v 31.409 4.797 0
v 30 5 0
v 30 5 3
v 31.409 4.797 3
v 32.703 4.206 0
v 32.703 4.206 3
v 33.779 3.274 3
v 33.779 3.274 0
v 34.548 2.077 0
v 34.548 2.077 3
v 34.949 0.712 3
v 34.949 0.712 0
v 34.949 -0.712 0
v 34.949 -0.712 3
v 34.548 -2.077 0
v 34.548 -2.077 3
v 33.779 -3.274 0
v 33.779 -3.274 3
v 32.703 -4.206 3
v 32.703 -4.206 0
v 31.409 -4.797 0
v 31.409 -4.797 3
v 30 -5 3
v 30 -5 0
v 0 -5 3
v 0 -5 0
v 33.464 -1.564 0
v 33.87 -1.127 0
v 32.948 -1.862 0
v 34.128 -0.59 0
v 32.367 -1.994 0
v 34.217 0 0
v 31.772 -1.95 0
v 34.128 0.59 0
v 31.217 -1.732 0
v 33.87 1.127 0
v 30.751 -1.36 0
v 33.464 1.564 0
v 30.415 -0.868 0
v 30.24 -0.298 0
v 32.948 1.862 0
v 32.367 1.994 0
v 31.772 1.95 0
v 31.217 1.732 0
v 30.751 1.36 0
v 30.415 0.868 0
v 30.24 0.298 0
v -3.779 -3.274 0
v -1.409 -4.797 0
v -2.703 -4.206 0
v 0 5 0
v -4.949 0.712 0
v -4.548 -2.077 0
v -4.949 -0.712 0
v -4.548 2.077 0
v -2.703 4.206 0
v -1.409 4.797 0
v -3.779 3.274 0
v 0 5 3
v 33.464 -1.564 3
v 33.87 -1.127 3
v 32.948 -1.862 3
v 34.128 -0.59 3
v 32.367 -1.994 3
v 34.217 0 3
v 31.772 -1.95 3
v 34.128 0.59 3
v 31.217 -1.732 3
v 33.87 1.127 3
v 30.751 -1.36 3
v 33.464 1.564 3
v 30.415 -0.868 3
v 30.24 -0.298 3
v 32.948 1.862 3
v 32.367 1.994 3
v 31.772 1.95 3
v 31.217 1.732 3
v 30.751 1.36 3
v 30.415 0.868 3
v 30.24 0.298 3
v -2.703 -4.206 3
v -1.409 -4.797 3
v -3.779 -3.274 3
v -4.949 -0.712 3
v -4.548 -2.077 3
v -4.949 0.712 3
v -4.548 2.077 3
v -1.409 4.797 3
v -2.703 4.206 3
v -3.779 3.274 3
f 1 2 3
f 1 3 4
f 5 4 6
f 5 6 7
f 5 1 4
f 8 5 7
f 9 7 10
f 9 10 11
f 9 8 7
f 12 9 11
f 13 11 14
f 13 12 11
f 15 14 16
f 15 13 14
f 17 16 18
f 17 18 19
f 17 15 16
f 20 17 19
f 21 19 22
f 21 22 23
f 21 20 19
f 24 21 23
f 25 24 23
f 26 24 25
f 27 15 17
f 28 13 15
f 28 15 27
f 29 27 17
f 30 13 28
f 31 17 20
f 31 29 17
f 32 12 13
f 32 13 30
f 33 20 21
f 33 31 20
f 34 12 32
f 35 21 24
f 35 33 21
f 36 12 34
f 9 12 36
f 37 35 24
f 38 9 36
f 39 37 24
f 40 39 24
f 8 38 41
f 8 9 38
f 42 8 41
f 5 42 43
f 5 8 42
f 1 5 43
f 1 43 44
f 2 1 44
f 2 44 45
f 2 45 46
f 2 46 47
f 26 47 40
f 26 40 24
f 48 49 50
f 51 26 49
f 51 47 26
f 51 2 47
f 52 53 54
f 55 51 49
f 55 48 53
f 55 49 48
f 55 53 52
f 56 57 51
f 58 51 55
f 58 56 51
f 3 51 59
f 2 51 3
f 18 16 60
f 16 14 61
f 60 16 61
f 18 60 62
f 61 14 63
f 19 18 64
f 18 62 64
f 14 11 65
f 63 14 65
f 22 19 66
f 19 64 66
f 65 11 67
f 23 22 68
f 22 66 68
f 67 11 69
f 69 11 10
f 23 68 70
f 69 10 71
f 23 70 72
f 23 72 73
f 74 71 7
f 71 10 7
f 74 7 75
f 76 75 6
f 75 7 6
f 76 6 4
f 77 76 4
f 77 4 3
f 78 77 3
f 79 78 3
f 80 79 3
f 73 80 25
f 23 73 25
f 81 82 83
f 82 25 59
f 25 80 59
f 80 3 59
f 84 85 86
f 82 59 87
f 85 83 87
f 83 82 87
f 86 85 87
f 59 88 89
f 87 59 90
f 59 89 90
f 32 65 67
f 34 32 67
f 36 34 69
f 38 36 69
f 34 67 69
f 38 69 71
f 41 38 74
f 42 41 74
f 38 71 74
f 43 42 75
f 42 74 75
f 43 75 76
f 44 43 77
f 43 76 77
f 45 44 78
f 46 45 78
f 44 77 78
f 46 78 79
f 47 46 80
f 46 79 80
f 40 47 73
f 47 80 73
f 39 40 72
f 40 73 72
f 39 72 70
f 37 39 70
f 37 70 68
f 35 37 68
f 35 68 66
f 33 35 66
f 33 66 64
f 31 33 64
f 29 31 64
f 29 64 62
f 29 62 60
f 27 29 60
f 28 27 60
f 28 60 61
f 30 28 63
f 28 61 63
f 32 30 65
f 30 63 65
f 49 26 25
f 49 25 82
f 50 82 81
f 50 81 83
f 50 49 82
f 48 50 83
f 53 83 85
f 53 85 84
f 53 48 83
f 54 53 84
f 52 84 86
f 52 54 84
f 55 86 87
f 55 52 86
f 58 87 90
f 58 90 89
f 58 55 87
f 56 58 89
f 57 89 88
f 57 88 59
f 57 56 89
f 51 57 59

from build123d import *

# Parameters (mm, degrees)
BOSS_EXTRU_1_DEPTH      = 3
ESQUISSE2_R             = 2
ENL_V_MAT_EXTRU_1_DEPTH = 3


with BuildPart() as part:
    # Esquisse1 → Boss.-Extru.1 (new body)
    with BuildSketch(Plane.XY):
        with BuildLine():
            Line((0, 5), (30, 5))
            ThreePointArc((30, 5), (35, 0), (30, -5))
            Line((30, -5), (0, -5))
            ThreePointArc((0, -5), (-5, 0), (0, 5))
        make_face()
    extrude(amount=BOSS_EXTRU_1_DEPTH)

    # Esquisse2 → Enlèv. mat.-Extru.1 (cut)
    with BuildSketch(Plane.XY.offset(3)):
        with Locations((32.217323413, 0)):
            Circle(ESQUISSE2_R)
    extrude(amount=-ENL_V_MAT_EXTRU_1_DEPTH, mode=Mode.SUBTRACT)


solid = part.part
